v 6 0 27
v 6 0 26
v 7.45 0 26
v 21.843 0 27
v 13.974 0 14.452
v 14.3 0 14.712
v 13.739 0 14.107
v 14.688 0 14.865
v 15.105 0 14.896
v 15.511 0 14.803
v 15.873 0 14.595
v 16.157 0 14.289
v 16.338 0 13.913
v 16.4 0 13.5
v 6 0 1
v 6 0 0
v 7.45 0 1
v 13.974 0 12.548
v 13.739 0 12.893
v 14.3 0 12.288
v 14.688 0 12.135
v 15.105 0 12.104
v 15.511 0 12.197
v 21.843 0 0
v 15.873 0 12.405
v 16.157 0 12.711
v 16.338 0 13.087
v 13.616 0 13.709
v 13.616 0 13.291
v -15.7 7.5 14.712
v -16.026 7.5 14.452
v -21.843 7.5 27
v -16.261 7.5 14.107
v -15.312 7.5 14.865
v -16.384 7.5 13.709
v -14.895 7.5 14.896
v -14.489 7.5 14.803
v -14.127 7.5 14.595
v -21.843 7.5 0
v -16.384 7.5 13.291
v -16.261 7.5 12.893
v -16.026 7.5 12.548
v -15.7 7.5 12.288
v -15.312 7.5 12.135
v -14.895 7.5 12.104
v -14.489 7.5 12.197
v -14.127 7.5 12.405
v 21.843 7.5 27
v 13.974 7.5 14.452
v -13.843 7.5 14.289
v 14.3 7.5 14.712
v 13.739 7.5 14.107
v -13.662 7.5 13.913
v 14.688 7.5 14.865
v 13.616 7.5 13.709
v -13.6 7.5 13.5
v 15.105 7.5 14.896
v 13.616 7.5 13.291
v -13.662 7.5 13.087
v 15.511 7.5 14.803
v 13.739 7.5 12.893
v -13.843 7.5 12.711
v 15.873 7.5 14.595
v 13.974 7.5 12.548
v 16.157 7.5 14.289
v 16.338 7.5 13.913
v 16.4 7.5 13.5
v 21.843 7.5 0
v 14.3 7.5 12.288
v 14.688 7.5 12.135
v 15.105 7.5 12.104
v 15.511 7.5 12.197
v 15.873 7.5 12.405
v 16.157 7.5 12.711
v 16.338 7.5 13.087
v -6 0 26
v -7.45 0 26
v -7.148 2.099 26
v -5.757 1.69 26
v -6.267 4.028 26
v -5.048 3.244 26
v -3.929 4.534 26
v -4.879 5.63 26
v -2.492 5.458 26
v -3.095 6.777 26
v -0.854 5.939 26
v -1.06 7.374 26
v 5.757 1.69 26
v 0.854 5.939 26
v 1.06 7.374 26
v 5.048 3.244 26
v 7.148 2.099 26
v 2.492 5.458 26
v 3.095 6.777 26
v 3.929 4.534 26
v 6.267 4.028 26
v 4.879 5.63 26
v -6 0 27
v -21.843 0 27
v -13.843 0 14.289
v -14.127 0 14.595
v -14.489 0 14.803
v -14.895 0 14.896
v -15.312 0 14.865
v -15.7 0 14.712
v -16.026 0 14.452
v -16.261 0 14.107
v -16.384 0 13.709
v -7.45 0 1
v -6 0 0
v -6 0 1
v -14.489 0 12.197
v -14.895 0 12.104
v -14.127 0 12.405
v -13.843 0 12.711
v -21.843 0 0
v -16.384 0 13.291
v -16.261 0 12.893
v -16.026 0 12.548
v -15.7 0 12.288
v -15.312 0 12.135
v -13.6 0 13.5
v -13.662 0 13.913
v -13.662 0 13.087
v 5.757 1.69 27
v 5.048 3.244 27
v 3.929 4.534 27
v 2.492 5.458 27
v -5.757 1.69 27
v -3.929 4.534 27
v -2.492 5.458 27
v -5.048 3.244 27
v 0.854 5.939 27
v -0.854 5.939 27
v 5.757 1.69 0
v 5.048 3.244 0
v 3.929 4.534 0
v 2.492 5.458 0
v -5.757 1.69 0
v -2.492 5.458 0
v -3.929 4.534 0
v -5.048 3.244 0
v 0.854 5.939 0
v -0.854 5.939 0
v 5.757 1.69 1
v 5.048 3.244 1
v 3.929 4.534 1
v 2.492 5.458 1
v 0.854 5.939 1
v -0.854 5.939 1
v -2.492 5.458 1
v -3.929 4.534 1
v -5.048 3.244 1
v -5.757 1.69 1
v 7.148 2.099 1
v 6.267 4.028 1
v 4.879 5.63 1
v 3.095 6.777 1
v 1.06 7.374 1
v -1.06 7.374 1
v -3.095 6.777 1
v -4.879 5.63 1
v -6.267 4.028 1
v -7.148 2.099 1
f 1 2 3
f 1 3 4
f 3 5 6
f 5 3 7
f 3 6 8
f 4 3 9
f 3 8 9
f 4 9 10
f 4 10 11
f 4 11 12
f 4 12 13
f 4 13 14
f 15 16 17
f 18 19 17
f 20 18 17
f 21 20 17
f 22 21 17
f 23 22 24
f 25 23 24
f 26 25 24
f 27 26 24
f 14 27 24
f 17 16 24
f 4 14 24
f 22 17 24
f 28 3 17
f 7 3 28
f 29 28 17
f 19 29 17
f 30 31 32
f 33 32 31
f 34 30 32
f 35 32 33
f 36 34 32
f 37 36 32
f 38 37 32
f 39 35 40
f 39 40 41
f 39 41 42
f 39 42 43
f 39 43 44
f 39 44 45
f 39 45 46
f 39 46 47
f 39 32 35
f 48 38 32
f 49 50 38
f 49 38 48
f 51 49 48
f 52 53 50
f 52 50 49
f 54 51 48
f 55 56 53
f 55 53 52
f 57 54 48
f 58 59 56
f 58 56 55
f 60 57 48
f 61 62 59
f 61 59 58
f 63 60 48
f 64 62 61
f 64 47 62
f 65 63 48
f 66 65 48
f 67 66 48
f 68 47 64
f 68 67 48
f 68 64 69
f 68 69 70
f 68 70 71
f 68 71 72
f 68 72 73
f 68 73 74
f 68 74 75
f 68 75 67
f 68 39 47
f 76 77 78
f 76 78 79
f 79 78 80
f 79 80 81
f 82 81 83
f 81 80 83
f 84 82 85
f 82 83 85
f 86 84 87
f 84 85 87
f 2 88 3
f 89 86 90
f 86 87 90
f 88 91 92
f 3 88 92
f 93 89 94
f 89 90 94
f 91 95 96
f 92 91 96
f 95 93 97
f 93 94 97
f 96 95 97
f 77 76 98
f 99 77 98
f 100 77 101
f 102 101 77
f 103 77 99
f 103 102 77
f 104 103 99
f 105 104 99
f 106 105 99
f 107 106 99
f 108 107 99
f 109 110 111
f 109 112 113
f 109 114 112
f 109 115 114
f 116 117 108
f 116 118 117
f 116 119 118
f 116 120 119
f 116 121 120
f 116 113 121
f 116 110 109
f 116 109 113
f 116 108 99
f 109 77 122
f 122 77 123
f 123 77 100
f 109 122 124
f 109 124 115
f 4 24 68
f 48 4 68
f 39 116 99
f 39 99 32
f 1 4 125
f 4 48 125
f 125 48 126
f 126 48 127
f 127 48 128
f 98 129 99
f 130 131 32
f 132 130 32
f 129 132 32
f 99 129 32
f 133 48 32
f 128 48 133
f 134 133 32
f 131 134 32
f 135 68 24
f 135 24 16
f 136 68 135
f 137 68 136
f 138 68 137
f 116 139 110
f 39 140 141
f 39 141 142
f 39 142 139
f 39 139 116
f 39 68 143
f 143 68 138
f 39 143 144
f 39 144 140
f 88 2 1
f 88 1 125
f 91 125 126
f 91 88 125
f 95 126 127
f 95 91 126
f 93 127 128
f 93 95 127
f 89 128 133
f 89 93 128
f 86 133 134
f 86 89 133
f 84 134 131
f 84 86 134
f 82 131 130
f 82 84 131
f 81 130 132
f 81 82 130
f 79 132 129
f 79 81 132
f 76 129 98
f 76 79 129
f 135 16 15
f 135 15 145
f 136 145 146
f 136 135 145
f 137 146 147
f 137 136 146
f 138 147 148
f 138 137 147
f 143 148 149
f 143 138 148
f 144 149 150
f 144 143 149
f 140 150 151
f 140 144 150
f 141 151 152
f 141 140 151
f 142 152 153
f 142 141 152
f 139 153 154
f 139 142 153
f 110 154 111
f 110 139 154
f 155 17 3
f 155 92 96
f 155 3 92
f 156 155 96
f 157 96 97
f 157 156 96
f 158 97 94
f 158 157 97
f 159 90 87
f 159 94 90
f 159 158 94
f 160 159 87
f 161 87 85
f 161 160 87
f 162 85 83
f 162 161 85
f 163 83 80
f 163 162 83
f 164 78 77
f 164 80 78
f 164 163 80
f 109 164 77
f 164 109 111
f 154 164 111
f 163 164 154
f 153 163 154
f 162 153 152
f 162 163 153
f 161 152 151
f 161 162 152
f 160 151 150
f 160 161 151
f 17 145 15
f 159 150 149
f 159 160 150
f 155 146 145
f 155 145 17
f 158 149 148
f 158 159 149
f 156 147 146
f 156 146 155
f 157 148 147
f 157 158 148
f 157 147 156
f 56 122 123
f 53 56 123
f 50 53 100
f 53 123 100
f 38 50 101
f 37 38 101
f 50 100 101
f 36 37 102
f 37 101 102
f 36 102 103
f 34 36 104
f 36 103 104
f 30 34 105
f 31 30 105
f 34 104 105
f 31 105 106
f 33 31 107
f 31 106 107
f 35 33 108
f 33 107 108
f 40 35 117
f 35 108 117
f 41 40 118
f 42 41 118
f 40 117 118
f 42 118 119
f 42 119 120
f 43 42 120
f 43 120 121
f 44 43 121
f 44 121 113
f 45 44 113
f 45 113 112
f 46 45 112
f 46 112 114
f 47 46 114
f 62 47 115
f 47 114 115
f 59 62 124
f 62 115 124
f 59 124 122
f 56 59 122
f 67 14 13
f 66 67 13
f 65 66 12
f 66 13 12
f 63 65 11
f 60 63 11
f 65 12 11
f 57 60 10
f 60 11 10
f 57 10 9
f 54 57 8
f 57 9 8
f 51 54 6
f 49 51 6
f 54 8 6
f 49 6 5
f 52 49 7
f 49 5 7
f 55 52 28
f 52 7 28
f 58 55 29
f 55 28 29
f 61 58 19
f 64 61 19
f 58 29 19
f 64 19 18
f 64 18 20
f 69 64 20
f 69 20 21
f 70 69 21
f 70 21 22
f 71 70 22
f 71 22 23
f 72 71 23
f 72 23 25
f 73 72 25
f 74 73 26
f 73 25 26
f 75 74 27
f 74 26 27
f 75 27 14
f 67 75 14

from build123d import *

# Parameters (mm, degrees)
SKETCH006_R  = 1.4
PAD004_DEPTH = 7.5
PAD005_DEPTH = 1
PAD_DEPTH    = 1
PAD006_DEPTH = 27


with BuildPart() as mount:
    # Sketch006 → Pad004 (new body)
    with BuildSketch(Plane.XZ):
        with Locations((-15, 13.5)):
            Circle(SKETCH006_R)
        with Locations((15, 13.5)):
            Circle(SKETCH006_R)
    extrude(amount=-PAD004_DEPTH)


with BuildPart() as toplip:
    # Sketch005 → Pad005 (new body)
    with BuildSketch(Plane.XY.offset(26)):
        with BuildLine():
            ThreePointArc((7.46, 0), (0, 7.46), (-7.46, 0))
            Line((-7.46, 0), (-6, 0))
            ThreePointArc((6, 0), (0, 6), (-6, 0))
            Line((7.46, 0), (6, 0))
        make_face()
    extrude(amount=PAD005_DEPTH)


with BuildPart() as bottomlip:
    # Sketch003 → Pad (new body)
    with BuildSketch(Plane.XY):
        with BuildLine():
            ThreePointArc((7.46, 0), (0, 7.46), (-7.46, 0))
            Line((-7.46, 0), (-6, 0))
            ThreePointArc((6, 0), (0, 6), (-6, 0))
            Line((7.46, 0), (6, 0))
        make_face()
    extrude(amount=PAD_DEPTH)


with BuildPart() as final:
    # Sketch → Pad006 (new body)
    with BuildSketch(Plane.XY):
        with BuildLine():
            ThreePointArc((7.45, 0), (0, 7.45), (-7.45, 0))
            Line((-7.45, 0), (-21.8427, 0))
            Line((-21.8427, 0), (-21.8427, 7.5))
            Line((-21.8427, 7.5), (21.8427, 7.5))
            Line((21.8427, 0), (21.8427, 7.5))
            Line((7.45, 0), (21.8427, 0))
        make_face()
    extrude(amount=PAD006_DEPTH)

    # Fusion: union TopLip, BottomLip
    add(toplip.part)
    add(bottomlip.part)

    # Cut: cut Mount
    add(mount.part, mode=Mode.SUBTRACT)


solid = final.part
